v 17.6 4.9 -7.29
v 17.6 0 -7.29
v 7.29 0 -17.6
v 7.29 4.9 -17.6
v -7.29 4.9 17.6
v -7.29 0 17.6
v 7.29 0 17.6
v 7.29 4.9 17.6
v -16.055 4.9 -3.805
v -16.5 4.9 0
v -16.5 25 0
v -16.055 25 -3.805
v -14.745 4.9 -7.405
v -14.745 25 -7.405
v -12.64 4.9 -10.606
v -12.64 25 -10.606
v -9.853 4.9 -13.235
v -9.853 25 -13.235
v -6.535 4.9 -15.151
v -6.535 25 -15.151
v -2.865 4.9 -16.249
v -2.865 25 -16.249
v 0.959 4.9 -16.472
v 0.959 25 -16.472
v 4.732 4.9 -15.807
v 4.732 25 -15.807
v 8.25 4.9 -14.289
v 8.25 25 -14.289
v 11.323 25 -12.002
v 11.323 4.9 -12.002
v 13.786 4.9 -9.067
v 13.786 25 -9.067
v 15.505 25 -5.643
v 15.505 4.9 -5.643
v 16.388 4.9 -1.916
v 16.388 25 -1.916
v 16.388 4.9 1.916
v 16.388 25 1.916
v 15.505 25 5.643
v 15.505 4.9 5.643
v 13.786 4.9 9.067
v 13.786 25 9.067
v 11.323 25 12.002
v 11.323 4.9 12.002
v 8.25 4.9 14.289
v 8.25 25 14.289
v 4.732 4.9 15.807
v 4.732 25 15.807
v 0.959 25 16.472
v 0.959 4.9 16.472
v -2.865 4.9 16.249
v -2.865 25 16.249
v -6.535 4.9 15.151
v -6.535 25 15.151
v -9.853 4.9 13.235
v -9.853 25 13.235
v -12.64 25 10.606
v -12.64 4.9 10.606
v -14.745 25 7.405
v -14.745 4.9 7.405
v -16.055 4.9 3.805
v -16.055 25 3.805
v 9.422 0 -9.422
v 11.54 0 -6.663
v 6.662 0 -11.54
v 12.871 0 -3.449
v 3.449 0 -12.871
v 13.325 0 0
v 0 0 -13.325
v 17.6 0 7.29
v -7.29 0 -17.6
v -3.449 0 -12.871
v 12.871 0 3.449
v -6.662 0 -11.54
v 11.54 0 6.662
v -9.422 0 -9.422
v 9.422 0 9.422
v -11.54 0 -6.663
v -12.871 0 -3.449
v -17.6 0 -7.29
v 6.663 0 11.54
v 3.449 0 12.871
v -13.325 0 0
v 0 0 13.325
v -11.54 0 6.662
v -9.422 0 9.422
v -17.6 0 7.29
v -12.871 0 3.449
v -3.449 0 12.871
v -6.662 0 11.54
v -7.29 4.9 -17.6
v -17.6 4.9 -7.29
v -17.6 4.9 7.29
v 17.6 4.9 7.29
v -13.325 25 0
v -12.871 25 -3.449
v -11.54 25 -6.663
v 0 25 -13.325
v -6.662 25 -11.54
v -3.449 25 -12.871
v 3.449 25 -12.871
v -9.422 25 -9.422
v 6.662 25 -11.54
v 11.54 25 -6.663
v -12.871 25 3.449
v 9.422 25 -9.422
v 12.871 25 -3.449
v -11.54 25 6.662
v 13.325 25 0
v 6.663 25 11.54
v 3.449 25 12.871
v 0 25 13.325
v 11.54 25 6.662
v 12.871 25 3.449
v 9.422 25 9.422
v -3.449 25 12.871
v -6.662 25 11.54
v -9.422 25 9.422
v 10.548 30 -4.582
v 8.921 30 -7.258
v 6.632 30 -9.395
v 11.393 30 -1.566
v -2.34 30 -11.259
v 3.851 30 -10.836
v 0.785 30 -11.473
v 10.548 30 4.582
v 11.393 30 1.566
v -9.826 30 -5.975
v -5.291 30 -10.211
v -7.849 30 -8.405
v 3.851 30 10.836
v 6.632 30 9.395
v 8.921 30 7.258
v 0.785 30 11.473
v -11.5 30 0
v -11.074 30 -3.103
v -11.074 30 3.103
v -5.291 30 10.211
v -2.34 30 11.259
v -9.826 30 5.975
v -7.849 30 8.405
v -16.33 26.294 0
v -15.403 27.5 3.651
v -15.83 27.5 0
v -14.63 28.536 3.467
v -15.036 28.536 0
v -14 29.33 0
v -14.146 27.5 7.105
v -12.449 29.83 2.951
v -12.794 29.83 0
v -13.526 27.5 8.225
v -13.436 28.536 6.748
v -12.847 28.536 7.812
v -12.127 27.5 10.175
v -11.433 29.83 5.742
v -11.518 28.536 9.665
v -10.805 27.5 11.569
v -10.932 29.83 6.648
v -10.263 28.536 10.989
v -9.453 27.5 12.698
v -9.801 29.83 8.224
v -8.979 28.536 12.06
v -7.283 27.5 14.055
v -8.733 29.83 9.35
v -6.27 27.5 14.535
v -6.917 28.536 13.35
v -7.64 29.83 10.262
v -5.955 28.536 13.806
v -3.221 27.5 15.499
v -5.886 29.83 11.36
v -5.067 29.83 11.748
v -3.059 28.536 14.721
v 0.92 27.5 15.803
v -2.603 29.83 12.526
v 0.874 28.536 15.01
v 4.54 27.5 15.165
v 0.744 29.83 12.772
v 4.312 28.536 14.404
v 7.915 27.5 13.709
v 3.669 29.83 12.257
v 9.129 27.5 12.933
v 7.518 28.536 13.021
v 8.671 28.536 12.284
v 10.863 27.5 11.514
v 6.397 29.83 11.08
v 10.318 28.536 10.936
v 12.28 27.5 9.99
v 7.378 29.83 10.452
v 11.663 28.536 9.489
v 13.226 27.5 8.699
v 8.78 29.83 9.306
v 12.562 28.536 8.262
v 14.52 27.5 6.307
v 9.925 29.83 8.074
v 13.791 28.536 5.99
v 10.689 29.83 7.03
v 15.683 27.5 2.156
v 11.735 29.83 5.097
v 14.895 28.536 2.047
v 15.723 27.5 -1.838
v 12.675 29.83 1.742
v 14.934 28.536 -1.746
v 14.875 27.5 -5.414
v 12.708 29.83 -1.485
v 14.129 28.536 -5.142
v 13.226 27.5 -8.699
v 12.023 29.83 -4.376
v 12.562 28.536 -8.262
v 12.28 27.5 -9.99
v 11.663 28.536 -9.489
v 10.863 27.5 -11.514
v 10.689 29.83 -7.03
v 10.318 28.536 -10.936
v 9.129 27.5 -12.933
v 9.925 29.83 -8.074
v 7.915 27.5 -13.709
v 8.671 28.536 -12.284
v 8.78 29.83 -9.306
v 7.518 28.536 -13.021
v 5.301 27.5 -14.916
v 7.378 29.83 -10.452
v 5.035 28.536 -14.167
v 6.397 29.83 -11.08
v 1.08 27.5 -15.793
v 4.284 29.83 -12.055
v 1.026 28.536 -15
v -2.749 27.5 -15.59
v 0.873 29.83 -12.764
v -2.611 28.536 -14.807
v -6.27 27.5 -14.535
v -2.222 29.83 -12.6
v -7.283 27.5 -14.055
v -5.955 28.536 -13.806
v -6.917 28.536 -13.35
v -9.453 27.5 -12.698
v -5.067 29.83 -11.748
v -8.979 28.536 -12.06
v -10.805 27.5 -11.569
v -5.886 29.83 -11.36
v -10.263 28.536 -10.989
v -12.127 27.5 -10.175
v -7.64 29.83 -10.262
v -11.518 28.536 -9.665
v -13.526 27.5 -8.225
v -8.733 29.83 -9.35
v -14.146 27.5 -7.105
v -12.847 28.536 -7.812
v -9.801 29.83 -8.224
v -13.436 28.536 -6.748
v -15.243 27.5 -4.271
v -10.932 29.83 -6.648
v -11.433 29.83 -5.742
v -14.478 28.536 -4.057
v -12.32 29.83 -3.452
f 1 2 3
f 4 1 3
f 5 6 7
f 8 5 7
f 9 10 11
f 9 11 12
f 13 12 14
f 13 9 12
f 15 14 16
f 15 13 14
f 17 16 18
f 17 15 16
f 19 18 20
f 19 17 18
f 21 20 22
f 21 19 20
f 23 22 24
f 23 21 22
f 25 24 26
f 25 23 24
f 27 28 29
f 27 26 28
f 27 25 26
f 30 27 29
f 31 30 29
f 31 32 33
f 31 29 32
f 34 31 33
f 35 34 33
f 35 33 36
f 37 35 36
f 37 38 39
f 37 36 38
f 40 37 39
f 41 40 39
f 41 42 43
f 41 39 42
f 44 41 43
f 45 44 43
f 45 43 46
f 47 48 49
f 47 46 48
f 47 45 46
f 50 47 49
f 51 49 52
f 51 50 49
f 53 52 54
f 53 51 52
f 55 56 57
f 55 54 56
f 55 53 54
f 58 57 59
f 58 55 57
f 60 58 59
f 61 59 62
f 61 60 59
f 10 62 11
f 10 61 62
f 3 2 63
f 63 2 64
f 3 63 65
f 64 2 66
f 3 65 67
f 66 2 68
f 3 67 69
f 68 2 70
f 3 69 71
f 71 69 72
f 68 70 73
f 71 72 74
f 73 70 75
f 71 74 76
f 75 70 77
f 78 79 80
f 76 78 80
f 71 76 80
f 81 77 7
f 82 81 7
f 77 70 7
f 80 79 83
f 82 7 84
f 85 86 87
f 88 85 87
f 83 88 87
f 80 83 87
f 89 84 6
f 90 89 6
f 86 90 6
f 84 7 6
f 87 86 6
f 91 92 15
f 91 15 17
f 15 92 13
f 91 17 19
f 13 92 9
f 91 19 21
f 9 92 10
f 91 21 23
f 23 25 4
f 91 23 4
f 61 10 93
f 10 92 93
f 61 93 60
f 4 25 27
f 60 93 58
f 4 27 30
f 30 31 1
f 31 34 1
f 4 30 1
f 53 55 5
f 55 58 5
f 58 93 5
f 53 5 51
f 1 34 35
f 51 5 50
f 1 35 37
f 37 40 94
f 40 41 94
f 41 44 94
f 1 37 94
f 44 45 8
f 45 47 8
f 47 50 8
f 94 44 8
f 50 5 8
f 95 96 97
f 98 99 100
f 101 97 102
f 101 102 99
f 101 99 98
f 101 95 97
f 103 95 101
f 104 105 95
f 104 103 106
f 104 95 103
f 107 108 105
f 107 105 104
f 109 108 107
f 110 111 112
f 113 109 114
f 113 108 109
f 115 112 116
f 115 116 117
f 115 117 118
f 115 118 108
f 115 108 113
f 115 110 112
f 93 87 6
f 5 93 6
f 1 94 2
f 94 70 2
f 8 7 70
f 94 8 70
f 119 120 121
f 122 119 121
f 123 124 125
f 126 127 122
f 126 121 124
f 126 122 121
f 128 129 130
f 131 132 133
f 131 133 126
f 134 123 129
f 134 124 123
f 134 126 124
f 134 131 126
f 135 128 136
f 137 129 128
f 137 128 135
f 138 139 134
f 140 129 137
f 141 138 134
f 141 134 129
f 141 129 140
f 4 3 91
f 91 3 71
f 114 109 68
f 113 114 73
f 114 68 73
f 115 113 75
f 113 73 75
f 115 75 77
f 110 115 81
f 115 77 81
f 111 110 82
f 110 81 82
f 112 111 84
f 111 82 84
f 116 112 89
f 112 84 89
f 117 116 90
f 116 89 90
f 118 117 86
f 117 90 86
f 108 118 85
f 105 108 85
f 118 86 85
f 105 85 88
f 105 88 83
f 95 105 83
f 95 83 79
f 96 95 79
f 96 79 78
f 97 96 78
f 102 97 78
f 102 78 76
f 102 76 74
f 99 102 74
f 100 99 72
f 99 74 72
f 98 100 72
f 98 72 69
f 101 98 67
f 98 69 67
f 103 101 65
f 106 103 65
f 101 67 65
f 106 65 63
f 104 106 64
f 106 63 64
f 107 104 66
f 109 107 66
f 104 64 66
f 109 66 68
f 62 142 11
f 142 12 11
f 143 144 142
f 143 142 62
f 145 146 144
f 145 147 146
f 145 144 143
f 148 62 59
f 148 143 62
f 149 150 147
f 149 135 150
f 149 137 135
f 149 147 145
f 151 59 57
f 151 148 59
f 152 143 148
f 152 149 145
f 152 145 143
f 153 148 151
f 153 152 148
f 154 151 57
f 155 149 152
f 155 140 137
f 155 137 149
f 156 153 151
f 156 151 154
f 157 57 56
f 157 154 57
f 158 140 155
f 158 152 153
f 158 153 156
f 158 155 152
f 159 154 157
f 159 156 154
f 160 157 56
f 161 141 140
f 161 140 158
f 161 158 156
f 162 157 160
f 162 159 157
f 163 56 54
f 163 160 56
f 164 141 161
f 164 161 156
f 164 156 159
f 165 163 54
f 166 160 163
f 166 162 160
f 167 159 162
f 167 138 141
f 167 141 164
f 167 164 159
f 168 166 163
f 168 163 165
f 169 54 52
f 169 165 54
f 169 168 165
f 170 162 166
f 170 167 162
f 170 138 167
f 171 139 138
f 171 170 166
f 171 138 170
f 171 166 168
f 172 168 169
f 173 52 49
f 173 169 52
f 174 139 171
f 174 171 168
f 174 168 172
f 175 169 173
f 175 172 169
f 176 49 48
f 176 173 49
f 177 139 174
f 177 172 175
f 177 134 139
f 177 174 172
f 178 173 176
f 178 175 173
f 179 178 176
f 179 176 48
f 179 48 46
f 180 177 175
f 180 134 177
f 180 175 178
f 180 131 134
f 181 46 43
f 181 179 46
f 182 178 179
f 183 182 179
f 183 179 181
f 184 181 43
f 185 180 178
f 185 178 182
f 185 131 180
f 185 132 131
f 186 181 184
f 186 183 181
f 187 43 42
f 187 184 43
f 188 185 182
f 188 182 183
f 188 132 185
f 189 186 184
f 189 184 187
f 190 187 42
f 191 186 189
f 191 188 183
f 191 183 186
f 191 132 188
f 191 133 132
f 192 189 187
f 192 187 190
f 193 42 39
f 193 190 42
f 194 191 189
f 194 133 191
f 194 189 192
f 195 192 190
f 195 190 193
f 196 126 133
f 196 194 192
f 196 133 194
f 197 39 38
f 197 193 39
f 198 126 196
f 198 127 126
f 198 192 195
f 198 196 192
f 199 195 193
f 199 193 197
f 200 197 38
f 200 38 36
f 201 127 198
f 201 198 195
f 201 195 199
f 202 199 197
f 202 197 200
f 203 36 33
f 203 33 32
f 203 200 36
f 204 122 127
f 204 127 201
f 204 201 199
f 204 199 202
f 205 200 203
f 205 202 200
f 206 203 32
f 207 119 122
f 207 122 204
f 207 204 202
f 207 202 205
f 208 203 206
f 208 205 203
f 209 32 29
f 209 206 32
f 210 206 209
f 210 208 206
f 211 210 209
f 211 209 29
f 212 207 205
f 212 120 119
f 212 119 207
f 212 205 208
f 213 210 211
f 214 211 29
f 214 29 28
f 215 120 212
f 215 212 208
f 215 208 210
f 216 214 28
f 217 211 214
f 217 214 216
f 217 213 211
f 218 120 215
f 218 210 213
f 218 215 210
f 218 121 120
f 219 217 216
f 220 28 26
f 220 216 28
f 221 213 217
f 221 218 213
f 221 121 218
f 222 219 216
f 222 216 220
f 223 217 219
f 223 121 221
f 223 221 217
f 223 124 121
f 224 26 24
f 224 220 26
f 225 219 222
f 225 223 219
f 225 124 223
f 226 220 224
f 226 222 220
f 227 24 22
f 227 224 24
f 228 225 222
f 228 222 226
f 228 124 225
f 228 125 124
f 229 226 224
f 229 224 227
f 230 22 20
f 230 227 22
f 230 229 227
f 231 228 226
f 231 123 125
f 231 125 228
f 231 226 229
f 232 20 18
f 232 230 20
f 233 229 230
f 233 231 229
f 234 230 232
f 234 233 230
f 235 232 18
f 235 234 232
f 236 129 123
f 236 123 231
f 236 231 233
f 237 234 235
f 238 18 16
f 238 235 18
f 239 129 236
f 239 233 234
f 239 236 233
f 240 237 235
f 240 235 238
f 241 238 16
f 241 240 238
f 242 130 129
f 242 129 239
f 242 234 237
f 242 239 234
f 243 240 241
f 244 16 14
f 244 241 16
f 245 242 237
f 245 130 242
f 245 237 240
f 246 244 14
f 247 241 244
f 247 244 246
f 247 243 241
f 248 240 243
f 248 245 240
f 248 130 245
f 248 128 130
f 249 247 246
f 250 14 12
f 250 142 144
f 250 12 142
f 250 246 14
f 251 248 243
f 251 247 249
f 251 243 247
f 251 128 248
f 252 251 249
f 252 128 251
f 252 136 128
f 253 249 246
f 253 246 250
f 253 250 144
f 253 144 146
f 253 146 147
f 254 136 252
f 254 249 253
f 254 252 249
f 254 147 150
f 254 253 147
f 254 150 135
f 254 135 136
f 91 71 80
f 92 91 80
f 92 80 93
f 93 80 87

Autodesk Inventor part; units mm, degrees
ref_plane "YZ Plane" through (0, 0, 0) normal (1, 0, 0) x (0, 1, 0)
ref_plane "XZ Plane" through (0, 0, 0) normal (0, 1, 0) x (-1, 0, 0)
ref_plane "XY Plane" through (0, 0, 0) normal (0, 0, 1) x (1, 0, 0)
sketch "Boceto1" plane through (0, 0, 0) normal (0, 1, 0) x (-1, 0, 0)
  circle A0 centre (0, 0) radius 16.5
  dimension "d0" = 33
extrude "Extrusión1" add sketch "Boceto1" along normal blind 30
sketch "Boceto2" plane through (0, 0, 0) normal (0, -1, 0) x (1, 0, 0)
  line L0 (-7.2902, 17.6) -> (7.2902, 17.6)
  line L1 (17.6, 7.2902) -> (17.6, -7.2902)
  line L2 (7.2902, -17.6) -> (-7.2902, -17.6)
  line L3 (-17.6, -7.2902) -> (-17.6, 7.2902)
  line L4 (-17.6, 17.6) -> (17.6, -17.6) construction
  line L5 (17.6, 17.6) -> (-17.6, -17.6) construction
  line L6 (-17.6, 7.2902) -> (-7.2902, 17.6)
  line L7 (-24.8902, 0) -> (10.3098, 0) construction
  line L8 (7.2902, 17.6) -> (17.6, 7.2902)
  line L9 (17.6, -7.2902) -> (7.2902, -17.6)
  line L10 (-7.2902, -17.6) -> (-17.6, -7.2902)
  line L11 (-24.8902, 0) -> (24.8902, 0)
  line L12 (0, -24.8902) -> (0, 24.8902)
  point P0 (0, 0)
  point P1 (0, 0)
  dimension "d3" = 35.2
  dimension "d4" = 35.2
  dimension "d5" = 35.2
  dimension "d6" = 45
  dimension "d7" = 35.2
extrude "Extrusión2" add sketch "Boceto2" against normal blind 4.9
fillet "Empalme1" radius 5 1 edges at (16.5, 30, 0)
sketch "Boceto3" plane through (0, 0, 0) normal (0, -1, 0) x (1, 0, 0)
  circle A0 centre (0, 0) radius 13.325
  dimension "d11" = 26.65
extrude "Extrusión3" cut sketch "Boceto3" against normal blind 25
properties part number "Tapón" material "PVC, no plastificado"
